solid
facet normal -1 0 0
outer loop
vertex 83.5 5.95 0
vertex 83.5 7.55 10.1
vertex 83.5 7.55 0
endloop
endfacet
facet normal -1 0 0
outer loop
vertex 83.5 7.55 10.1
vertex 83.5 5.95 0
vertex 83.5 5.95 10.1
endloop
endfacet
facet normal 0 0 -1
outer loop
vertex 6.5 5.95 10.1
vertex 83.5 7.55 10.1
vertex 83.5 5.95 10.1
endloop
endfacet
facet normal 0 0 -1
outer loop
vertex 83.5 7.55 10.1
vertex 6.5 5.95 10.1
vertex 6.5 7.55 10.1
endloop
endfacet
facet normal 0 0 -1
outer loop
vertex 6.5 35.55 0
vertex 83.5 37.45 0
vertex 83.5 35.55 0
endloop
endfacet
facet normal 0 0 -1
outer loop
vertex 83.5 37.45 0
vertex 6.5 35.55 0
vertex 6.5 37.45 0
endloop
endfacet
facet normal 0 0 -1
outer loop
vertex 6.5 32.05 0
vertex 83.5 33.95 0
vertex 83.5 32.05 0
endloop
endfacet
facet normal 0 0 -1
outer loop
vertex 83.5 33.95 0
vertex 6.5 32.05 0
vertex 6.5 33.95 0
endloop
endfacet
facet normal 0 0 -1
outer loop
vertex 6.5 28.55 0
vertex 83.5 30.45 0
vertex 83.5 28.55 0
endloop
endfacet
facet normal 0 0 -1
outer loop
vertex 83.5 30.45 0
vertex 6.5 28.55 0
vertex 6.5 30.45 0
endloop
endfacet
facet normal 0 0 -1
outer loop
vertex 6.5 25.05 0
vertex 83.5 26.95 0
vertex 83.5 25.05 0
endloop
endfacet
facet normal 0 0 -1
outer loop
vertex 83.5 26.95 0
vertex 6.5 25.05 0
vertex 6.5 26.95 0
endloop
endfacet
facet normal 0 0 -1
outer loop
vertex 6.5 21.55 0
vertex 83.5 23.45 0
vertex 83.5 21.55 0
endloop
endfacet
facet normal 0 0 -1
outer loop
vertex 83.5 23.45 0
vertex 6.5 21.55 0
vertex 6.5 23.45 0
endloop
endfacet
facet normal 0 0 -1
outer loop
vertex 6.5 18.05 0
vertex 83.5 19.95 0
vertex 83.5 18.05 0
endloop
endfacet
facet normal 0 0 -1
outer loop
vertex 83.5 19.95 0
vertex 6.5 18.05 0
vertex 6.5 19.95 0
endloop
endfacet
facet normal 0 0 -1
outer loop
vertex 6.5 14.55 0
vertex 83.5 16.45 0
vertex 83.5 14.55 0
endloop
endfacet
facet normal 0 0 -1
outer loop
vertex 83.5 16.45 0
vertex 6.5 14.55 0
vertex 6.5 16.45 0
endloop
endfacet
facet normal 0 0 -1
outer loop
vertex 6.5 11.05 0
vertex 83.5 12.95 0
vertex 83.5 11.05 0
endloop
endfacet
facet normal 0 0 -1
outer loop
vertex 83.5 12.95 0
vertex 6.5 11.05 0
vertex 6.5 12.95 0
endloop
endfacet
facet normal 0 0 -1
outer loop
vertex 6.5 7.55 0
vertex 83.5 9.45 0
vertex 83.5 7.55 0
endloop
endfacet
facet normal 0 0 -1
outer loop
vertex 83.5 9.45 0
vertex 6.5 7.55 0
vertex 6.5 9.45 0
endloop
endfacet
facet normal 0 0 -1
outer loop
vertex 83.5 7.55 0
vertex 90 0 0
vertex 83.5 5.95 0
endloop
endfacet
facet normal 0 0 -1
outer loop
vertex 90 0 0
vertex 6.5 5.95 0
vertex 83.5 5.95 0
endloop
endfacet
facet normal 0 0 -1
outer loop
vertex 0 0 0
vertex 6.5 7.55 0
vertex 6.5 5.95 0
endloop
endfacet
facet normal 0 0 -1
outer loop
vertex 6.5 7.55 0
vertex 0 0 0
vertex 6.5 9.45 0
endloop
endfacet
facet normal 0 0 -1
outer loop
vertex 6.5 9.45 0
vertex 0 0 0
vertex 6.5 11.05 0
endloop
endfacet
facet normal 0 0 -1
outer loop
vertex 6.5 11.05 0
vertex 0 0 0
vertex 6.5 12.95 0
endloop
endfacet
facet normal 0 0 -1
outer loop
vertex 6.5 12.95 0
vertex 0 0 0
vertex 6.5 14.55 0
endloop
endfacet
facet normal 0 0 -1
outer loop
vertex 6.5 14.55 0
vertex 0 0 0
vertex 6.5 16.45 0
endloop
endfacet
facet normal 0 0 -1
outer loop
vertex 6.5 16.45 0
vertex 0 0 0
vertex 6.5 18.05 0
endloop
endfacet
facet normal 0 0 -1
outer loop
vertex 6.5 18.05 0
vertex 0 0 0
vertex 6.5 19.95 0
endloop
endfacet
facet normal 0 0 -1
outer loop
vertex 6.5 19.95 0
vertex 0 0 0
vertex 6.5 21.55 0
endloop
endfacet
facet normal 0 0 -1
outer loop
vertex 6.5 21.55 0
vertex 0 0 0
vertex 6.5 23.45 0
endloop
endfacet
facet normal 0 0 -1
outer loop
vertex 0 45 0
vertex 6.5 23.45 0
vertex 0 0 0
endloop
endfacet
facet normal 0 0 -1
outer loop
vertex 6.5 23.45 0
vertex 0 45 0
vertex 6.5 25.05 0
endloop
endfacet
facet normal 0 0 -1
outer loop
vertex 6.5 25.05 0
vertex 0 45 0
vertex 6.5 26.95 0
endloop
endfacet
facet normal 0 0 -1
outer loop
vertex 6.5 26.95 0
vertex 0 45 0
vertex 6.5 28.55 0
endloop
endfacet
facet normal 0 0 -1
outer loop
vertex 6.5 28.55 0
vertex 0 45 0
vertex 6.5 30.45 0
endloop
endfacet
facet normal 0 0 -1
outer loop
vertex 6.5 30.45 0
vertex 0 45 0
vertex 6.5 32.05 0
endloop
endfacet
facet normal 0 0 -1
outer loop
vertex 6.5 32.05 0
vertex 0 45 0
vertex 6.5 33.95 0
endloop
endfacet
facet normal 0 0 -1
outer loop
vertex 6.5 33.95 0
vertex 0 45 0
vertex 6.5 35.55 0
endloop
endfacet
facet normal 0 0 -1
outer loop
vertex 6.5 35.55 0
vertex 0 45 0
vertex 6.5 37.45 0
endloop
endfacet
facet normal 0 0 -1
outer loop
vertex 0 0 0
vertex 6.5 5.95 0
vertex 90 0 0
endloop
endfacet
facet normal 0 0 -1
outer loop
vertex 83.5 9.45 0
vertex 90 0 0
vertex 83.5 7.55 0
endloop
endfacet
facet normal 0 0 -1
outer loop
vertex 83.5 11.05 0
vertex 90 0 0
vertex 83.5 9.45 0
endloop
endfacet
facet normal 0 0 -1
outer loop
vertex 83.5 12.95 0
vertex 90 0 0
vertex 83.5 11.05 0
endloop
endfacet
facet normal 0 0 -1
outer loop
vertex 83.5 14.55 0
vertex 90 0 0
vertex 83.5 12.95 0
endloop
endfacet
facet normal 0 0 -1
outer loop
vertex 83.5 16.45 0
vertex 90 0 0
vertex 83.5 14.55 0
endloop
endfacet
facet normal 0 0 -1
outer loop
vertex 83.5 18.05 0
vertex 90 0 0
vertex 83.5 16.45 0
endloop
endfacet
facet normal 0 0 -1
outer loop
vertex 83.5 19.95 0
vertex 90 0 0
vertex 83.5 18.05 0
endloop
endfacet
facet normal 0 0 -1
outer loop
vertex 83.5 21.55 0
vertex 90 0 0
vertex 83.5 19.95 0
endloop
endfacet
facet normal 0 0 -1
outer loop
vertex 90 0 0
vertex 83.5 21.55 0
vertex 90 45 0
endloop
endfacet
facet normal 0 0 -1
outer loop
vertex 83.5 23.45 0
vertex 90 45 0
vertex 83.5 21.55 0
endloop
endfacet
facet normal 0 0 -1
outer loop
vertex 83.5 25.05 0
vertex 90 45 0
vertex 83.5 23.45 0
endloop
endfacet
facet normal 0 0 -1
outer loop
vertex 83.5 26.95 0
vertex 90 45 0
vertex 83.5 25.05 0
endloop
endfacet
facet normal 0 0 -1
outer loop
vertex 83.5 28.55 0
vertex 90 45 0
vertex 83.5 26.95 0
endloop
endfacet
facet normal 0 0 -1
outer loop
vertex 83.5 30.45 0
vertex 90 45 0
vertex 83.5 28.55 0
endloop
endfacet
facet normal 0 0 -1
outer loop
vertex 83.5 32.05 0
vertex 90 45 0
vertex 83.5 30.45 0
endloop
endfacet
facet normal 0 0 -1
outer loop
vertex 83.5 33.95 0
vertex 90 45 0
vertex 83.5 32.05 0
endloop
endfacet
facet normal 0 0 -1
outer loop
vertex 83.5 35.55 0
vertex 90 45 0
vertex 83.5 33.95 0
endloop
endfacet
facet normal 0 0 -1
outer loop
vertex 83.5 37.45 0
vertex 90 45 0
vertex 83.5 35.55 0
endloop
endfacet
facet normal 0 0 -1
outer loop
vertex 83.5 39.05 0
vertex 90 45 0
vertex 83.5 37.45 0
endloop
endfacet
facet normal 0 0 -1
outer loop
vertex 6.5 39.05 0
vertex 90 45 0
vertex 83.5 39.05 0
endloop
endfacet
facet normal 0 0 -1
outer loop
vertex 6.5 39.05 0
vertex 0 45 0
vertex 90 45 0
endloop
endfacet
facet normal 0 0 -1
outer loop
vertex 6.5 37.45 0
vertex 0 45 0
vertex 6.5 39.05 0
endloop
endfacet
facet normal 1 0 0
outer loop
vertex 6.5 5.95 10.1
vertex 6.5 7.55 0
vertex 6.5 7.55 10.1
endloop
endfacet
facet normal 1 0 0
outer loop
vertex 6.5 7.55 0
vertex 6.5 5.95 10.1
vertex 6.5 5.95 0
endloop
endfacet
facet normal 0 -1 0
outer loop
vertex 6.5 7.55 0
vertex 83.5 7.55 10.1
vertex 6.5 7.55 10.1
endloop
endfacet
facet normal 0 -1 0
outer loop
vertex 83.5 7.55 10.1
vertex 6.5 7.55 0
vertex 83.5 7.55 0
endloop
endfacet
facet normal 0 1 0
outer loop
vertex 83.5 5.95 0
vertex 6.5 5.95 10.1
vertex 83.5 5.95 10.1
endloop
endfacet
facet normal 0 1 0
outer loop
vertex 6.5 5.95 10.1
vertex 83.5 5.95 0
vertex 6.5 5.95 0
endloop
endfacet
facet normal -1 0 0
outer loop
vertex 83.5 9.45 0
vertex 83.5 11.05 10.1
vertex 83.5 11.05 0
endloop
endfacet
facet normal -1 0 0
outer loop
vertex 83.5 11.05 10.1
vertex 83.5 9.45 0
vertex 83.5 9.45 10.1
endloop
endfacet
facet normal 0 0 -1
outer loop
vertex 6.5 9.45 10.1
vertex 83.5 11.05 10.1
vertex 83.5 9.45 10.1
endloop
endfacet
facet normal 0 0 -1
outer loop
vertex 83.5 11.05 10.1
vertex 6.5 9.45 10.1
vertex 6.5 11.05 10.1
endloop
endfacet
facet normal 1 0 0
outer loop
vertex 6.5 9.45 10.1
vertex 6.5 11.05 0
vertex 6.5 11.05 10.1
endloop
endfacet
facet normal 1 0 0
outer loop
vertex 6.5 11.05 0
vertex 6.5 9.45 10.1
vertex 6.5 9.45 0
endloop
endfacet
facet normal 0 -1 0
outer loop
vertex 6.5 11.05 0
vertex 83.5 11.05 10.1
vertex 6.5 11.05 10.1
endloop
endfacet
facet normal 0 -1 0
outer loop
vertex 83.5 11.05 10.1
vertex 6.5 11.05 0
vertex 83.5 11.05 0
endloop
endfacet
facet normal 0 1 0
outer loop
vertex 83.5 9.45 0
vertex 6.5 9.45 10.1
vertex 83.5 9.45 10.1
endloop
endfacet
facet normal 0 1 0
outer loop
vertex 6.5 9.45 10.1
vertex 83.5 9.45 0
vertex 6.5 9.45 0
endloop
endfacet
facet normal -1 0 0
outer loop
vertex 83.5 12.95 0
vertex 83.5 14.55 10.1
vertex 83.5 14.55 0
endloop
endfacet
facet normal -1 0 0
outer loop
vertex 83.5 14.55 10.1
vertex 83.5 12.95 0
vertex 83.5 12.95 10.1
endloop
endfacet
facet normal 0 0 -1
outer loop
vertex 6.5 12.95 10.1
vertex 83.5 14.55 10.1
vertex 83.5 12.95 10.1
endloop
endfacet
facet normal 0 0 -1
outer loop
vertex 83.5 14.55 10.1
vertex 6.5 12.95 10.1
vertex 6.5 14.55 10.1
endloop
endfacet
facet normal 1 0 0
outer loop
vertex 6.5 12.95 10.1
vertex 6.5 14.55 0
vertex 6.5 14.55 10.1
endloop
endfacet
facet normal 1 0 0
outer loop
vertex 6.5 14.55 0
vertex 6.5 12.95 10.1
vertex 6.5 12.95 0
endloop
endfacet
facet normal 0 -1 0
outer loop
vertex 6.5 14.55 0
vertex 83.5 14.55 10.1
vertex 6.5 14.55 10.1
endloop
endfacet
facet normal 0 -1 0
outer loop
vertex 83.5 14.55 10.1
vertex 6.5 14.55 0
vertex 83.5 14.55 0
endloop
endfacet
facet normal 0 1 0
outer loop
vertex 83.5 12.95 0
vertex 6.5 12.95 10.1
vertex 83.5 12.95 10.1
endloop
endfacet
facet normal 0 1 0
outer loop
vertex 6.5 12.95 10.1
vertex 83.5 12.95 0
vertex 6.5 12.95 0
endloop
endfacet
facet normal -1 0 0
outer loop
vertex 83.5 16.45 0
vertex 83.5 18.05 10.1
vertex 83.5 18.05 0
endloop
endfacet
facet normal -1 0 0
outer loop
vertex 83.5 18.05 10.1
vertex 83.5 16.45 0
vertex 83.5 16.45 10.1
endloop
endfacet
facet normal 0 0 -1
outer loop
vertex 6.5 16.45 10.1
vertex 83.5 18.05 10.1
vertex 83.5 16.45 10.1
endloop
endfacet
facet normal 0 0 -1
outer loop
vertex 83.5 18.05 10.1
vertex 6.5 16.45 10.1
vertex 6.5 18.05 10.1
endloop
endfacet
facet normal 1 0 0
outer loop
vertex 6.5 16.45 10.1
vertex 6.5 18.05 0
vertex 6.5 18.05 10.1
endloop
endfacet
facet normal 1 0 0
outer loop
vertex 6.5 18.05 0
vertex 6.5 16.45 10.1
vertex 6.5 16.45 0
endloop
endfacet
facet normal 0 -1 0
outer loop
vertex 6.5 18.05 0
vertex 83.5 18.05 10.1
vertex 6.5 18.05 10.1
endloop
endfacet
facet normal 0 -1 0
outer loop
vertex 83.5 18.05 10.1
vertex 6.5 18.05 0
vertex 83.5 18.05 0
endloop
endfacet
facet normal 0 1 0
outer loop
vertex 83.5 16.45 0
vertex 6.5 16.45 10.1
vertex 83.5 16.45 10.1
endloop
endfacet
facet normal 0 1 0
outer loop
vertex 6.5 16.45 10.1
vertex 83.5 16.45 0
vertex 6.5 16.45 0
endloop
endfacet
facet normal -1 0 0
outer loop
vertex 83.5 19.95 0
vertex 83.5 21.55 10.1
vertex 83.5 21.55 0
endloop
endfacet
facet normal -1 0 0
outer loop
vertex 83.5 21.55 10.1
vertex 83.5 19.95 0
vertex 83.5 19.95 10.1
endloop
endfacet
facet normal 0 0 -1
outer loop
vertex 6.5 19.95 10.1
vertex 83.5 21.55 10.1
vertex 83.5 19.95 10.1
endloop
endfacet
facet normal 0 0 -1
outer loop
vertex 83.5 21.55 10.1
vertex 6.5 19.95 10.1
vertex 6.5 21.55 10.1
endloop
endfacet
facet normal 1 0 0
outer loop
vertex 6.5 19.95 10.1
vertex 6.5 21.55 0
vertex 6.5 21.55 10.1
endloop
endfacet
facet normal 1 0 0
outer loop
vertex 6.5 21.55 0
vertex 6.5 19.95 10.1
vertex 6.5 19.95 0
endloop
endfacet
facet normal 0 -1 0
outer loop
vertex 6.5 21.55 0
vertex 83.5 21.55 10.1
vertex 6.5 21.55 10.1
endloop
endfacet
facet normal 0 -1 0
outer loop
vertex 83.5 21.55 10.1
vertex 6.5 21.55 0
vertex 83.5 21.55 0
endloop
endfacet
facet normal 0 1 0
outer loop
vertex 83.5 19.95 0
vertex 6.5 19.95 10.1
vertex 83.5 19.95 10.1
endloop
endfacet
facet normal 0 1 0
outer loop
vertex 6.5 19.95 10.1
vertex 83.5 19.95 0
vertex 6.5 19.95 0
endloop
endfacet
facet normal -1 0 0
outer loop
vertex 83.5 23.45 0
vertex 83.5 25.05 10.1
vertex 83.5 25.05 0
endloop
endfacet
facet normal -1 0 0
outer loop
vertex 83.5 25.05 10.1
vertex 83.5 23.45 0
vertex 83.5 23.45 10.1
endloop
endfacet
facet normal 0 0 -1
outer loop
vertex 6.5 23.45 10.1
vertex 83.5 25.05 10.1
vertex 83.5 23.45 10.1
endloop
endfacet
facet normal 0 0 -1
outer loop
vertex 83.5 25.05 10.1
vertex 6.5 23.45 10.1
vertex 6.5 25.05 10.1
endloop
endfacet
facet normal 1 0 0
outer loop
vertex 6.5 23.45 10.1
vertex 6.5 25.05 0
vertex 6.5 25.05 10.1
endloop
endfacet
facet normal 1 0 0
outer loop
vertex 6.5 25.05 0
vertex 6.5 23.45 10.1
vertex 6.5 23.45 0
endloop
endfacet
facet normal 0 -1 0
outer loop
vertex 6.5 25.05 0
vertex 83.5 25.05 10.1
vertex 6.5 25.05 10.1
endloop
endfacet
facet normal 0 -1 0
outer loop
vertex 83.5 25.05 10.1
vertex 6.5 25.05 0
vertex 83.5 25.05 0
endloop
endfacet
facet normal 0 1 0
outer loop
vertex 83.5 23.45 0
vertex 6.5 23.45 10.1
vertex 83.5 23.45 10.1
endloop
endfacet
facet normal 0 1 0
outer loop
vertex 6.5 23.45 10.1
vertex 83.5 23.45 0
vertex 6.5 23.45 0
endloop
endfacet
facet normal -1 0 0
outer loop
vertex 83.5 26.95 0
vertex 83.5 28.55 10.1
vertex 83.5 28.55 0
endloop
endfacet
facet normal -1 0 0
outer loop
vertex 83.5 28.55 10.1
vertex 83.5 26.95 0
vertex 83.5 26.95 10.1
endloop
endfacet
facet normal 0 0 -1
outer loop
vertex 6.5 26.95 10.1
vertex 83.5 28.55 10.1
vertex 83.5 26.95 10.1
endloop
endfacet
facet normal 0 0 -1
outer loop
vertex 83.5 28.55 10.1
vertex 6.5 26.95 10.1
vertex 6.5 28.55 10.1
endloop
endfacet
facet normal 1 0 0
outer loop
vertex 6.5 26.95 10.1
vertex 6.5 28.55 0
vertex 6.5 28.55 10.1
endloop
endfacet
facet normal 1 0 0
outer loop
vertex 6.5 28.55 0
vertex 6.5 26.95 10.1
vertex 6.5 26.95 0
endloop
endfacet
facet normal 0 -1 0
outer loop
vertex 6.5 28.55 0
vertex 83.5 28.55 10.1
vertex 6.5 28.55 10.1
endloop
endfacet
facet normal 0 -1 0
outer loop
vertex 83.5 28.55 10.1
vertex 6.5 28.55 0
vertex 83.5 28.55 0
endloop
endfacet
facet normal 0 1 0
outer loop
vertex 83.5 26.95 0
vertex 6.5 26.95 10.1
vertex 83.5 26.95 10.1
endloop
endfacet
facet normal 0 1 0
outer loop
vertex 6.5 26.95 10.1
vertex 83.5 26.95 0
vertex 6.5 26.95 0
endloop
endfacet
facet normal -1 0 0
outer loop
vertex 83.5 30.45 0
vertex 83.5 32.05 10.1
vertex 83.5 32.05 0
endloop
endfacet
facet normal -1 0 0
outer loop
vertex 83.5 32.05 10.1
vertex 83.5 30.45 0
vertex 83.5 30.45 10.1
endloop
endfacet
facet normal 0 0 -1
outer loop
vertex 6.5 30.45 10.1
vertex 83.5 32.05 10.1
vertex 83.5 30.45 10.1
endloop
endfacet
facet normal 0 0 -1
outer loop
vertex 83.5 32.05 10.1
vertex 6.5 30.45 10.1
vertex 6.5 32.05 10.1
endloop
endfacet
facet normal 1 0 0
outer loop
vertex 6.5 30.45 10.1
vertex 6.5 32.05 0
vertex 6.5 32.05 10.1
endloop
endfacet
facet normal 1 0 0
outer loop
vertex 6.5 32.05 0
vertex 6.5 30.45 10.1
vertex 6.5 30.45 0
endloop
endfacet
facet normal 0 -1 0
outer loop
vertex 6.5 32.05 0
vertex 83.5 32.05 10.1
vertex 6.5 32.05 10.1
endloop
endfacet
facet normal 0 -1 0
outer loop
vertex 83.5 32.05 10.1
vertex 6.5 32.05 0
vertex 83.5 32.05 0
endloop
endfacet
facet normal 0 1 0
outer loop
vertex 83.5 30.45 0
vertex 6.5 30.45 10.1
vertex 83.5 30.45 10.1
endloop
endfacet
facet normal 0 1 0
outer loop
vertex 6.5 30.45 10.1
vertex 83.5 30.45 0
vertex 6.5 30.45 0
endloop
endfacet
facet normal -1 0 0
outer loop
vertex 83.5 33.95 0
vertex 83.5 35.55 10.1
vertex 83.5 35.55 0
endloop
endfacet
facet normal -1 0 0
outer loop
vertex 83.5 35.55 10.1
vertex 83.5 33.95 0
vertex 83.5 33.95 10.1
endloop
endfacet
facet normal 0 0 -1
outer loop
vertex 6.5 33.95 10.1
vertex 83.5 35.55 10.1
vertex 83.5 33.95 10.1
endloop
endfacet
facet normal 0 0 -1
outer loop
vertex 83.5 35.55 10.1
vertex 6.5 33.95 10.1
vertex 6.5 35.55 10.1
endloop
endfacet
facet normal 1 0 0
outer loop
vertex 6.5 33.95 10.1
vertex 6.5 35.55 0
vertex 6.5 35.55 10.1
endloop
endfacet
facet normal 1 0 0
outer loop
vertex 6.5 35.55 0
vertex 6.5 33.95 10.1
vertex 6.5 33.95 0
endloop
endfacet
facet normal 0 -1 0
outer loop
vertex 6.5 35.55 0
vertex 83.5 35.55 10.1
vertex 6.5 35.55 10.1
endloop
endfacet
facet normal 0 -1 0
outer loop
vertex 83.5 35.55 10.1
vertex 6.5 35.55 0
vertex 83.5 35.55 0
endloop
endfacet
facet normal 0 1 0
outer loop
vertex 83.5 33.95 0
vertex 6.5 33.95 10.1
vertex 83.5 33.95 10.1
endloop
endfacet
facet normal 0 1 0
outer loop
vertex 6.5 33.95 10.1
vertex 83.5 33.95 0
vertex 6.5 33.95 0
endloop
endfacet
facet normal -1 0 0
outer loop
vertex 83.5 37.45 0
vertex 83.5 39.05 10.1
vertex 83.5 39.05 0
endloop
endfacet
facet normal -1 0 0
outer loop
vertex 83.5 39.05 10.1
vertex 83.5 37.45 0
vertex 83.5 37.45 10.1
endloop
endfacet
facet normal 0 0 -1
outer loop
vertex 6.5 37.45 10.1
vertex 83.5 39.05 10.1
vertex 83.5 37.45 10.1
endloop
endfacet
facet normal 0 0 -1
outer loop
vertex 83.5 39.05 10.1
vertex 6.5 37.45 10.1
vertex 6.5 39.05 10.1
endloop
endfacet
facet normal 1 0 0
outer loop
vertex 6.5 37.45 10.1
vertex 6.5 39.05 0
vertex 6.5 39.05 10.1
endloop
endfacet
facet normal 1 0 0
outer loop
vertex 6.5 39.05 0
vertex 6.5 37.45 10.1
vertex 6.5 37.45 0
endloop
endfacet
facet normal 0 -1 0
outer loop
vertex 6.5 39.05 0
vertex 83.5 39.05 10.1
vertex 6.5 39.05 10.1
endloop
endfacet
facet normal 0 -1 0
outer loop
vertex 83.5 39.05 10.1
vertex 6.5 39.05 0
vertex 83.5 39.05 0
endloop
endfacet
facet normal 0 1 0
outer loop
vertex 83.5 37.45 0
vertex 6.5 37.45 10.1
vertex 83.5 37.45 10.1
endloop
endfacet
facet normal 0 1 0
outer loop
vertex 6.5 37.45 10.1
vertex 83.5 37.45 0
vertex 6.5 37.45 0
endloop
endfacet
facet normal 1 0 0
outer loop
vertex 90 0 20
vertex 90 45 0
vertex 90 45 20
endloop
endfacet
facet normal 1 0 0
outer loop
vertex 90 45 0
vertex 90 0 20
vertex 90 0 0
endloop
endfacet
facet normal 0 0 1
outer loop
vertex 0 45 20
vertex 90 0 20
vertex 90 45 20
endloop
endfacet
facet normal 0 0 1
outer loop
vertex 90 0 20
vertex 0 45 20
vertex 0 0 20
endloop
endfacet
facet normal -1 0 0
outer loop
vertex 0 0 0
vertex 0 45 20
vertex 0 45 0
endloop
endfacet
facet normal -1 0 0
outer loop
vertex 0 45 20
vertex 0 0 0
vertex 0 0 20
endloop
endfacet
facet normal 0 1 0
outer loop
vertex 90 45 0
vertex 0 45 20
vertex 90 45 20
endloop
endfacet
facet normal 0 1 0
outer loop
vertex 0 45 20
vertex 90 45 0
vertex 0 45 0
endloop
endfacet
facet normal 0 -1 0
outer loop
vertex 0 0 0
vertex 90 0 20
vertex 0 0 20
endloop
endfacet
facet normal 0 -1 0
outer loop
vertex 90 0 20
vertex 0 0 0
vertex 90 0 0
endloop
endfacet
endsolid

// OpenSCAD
// Microscope slide drying rack - a solid base with 10 parallel slots for standing slides.

// Base dimensions
L_base = 90;
W_base = 45;
H_base = 20;

// Slide dimensions (standard 75x25x1 mm)
slide_len = 75;
slide_w   = 25;
slide_thk = 1;

// Slot dimensions
slot_len = 77;
slot_w   = 1.6;
slot_deep = 10;

// Spacing and positioning
slot_spacing = 3.5;
num_slots = 10;

// Derived positions
// Slots are centred in Y on the block
// First slot Y position: (W_base - slot_w) / 2 - (num_slots - 1) * slot_spacing / 2
y_start = (W_base - slot_w) / 2 - (num_slots - 1) * slot_spacing / 2;

// Slots are centred in X on the block
x_start = (L_base - slot_len) / 2;

$fn = 64;

difference() {
    // Main solid block
    translate([0, 0, 0]) cube([L_base, W_base, H_base]);

    // Cut 10 slots
    for (i = [0 : num_slots - 1]) {
        // Calculate Y position for this slot
        y_pos = y_start + i * slot_spacing;
        
        // Slot geometry: runs along X, width in Y, depth in Z
        // Slot is open at top (Z=H_base), so we cut from Z=0 to Z=slot_deep
        // To ensure clean cut, extend slightly past the bottom face
        translate([x_start, y_pos, 0]) 
            cube([slot_len, slot_w, slot_deep + 0.1]);
    }
}
